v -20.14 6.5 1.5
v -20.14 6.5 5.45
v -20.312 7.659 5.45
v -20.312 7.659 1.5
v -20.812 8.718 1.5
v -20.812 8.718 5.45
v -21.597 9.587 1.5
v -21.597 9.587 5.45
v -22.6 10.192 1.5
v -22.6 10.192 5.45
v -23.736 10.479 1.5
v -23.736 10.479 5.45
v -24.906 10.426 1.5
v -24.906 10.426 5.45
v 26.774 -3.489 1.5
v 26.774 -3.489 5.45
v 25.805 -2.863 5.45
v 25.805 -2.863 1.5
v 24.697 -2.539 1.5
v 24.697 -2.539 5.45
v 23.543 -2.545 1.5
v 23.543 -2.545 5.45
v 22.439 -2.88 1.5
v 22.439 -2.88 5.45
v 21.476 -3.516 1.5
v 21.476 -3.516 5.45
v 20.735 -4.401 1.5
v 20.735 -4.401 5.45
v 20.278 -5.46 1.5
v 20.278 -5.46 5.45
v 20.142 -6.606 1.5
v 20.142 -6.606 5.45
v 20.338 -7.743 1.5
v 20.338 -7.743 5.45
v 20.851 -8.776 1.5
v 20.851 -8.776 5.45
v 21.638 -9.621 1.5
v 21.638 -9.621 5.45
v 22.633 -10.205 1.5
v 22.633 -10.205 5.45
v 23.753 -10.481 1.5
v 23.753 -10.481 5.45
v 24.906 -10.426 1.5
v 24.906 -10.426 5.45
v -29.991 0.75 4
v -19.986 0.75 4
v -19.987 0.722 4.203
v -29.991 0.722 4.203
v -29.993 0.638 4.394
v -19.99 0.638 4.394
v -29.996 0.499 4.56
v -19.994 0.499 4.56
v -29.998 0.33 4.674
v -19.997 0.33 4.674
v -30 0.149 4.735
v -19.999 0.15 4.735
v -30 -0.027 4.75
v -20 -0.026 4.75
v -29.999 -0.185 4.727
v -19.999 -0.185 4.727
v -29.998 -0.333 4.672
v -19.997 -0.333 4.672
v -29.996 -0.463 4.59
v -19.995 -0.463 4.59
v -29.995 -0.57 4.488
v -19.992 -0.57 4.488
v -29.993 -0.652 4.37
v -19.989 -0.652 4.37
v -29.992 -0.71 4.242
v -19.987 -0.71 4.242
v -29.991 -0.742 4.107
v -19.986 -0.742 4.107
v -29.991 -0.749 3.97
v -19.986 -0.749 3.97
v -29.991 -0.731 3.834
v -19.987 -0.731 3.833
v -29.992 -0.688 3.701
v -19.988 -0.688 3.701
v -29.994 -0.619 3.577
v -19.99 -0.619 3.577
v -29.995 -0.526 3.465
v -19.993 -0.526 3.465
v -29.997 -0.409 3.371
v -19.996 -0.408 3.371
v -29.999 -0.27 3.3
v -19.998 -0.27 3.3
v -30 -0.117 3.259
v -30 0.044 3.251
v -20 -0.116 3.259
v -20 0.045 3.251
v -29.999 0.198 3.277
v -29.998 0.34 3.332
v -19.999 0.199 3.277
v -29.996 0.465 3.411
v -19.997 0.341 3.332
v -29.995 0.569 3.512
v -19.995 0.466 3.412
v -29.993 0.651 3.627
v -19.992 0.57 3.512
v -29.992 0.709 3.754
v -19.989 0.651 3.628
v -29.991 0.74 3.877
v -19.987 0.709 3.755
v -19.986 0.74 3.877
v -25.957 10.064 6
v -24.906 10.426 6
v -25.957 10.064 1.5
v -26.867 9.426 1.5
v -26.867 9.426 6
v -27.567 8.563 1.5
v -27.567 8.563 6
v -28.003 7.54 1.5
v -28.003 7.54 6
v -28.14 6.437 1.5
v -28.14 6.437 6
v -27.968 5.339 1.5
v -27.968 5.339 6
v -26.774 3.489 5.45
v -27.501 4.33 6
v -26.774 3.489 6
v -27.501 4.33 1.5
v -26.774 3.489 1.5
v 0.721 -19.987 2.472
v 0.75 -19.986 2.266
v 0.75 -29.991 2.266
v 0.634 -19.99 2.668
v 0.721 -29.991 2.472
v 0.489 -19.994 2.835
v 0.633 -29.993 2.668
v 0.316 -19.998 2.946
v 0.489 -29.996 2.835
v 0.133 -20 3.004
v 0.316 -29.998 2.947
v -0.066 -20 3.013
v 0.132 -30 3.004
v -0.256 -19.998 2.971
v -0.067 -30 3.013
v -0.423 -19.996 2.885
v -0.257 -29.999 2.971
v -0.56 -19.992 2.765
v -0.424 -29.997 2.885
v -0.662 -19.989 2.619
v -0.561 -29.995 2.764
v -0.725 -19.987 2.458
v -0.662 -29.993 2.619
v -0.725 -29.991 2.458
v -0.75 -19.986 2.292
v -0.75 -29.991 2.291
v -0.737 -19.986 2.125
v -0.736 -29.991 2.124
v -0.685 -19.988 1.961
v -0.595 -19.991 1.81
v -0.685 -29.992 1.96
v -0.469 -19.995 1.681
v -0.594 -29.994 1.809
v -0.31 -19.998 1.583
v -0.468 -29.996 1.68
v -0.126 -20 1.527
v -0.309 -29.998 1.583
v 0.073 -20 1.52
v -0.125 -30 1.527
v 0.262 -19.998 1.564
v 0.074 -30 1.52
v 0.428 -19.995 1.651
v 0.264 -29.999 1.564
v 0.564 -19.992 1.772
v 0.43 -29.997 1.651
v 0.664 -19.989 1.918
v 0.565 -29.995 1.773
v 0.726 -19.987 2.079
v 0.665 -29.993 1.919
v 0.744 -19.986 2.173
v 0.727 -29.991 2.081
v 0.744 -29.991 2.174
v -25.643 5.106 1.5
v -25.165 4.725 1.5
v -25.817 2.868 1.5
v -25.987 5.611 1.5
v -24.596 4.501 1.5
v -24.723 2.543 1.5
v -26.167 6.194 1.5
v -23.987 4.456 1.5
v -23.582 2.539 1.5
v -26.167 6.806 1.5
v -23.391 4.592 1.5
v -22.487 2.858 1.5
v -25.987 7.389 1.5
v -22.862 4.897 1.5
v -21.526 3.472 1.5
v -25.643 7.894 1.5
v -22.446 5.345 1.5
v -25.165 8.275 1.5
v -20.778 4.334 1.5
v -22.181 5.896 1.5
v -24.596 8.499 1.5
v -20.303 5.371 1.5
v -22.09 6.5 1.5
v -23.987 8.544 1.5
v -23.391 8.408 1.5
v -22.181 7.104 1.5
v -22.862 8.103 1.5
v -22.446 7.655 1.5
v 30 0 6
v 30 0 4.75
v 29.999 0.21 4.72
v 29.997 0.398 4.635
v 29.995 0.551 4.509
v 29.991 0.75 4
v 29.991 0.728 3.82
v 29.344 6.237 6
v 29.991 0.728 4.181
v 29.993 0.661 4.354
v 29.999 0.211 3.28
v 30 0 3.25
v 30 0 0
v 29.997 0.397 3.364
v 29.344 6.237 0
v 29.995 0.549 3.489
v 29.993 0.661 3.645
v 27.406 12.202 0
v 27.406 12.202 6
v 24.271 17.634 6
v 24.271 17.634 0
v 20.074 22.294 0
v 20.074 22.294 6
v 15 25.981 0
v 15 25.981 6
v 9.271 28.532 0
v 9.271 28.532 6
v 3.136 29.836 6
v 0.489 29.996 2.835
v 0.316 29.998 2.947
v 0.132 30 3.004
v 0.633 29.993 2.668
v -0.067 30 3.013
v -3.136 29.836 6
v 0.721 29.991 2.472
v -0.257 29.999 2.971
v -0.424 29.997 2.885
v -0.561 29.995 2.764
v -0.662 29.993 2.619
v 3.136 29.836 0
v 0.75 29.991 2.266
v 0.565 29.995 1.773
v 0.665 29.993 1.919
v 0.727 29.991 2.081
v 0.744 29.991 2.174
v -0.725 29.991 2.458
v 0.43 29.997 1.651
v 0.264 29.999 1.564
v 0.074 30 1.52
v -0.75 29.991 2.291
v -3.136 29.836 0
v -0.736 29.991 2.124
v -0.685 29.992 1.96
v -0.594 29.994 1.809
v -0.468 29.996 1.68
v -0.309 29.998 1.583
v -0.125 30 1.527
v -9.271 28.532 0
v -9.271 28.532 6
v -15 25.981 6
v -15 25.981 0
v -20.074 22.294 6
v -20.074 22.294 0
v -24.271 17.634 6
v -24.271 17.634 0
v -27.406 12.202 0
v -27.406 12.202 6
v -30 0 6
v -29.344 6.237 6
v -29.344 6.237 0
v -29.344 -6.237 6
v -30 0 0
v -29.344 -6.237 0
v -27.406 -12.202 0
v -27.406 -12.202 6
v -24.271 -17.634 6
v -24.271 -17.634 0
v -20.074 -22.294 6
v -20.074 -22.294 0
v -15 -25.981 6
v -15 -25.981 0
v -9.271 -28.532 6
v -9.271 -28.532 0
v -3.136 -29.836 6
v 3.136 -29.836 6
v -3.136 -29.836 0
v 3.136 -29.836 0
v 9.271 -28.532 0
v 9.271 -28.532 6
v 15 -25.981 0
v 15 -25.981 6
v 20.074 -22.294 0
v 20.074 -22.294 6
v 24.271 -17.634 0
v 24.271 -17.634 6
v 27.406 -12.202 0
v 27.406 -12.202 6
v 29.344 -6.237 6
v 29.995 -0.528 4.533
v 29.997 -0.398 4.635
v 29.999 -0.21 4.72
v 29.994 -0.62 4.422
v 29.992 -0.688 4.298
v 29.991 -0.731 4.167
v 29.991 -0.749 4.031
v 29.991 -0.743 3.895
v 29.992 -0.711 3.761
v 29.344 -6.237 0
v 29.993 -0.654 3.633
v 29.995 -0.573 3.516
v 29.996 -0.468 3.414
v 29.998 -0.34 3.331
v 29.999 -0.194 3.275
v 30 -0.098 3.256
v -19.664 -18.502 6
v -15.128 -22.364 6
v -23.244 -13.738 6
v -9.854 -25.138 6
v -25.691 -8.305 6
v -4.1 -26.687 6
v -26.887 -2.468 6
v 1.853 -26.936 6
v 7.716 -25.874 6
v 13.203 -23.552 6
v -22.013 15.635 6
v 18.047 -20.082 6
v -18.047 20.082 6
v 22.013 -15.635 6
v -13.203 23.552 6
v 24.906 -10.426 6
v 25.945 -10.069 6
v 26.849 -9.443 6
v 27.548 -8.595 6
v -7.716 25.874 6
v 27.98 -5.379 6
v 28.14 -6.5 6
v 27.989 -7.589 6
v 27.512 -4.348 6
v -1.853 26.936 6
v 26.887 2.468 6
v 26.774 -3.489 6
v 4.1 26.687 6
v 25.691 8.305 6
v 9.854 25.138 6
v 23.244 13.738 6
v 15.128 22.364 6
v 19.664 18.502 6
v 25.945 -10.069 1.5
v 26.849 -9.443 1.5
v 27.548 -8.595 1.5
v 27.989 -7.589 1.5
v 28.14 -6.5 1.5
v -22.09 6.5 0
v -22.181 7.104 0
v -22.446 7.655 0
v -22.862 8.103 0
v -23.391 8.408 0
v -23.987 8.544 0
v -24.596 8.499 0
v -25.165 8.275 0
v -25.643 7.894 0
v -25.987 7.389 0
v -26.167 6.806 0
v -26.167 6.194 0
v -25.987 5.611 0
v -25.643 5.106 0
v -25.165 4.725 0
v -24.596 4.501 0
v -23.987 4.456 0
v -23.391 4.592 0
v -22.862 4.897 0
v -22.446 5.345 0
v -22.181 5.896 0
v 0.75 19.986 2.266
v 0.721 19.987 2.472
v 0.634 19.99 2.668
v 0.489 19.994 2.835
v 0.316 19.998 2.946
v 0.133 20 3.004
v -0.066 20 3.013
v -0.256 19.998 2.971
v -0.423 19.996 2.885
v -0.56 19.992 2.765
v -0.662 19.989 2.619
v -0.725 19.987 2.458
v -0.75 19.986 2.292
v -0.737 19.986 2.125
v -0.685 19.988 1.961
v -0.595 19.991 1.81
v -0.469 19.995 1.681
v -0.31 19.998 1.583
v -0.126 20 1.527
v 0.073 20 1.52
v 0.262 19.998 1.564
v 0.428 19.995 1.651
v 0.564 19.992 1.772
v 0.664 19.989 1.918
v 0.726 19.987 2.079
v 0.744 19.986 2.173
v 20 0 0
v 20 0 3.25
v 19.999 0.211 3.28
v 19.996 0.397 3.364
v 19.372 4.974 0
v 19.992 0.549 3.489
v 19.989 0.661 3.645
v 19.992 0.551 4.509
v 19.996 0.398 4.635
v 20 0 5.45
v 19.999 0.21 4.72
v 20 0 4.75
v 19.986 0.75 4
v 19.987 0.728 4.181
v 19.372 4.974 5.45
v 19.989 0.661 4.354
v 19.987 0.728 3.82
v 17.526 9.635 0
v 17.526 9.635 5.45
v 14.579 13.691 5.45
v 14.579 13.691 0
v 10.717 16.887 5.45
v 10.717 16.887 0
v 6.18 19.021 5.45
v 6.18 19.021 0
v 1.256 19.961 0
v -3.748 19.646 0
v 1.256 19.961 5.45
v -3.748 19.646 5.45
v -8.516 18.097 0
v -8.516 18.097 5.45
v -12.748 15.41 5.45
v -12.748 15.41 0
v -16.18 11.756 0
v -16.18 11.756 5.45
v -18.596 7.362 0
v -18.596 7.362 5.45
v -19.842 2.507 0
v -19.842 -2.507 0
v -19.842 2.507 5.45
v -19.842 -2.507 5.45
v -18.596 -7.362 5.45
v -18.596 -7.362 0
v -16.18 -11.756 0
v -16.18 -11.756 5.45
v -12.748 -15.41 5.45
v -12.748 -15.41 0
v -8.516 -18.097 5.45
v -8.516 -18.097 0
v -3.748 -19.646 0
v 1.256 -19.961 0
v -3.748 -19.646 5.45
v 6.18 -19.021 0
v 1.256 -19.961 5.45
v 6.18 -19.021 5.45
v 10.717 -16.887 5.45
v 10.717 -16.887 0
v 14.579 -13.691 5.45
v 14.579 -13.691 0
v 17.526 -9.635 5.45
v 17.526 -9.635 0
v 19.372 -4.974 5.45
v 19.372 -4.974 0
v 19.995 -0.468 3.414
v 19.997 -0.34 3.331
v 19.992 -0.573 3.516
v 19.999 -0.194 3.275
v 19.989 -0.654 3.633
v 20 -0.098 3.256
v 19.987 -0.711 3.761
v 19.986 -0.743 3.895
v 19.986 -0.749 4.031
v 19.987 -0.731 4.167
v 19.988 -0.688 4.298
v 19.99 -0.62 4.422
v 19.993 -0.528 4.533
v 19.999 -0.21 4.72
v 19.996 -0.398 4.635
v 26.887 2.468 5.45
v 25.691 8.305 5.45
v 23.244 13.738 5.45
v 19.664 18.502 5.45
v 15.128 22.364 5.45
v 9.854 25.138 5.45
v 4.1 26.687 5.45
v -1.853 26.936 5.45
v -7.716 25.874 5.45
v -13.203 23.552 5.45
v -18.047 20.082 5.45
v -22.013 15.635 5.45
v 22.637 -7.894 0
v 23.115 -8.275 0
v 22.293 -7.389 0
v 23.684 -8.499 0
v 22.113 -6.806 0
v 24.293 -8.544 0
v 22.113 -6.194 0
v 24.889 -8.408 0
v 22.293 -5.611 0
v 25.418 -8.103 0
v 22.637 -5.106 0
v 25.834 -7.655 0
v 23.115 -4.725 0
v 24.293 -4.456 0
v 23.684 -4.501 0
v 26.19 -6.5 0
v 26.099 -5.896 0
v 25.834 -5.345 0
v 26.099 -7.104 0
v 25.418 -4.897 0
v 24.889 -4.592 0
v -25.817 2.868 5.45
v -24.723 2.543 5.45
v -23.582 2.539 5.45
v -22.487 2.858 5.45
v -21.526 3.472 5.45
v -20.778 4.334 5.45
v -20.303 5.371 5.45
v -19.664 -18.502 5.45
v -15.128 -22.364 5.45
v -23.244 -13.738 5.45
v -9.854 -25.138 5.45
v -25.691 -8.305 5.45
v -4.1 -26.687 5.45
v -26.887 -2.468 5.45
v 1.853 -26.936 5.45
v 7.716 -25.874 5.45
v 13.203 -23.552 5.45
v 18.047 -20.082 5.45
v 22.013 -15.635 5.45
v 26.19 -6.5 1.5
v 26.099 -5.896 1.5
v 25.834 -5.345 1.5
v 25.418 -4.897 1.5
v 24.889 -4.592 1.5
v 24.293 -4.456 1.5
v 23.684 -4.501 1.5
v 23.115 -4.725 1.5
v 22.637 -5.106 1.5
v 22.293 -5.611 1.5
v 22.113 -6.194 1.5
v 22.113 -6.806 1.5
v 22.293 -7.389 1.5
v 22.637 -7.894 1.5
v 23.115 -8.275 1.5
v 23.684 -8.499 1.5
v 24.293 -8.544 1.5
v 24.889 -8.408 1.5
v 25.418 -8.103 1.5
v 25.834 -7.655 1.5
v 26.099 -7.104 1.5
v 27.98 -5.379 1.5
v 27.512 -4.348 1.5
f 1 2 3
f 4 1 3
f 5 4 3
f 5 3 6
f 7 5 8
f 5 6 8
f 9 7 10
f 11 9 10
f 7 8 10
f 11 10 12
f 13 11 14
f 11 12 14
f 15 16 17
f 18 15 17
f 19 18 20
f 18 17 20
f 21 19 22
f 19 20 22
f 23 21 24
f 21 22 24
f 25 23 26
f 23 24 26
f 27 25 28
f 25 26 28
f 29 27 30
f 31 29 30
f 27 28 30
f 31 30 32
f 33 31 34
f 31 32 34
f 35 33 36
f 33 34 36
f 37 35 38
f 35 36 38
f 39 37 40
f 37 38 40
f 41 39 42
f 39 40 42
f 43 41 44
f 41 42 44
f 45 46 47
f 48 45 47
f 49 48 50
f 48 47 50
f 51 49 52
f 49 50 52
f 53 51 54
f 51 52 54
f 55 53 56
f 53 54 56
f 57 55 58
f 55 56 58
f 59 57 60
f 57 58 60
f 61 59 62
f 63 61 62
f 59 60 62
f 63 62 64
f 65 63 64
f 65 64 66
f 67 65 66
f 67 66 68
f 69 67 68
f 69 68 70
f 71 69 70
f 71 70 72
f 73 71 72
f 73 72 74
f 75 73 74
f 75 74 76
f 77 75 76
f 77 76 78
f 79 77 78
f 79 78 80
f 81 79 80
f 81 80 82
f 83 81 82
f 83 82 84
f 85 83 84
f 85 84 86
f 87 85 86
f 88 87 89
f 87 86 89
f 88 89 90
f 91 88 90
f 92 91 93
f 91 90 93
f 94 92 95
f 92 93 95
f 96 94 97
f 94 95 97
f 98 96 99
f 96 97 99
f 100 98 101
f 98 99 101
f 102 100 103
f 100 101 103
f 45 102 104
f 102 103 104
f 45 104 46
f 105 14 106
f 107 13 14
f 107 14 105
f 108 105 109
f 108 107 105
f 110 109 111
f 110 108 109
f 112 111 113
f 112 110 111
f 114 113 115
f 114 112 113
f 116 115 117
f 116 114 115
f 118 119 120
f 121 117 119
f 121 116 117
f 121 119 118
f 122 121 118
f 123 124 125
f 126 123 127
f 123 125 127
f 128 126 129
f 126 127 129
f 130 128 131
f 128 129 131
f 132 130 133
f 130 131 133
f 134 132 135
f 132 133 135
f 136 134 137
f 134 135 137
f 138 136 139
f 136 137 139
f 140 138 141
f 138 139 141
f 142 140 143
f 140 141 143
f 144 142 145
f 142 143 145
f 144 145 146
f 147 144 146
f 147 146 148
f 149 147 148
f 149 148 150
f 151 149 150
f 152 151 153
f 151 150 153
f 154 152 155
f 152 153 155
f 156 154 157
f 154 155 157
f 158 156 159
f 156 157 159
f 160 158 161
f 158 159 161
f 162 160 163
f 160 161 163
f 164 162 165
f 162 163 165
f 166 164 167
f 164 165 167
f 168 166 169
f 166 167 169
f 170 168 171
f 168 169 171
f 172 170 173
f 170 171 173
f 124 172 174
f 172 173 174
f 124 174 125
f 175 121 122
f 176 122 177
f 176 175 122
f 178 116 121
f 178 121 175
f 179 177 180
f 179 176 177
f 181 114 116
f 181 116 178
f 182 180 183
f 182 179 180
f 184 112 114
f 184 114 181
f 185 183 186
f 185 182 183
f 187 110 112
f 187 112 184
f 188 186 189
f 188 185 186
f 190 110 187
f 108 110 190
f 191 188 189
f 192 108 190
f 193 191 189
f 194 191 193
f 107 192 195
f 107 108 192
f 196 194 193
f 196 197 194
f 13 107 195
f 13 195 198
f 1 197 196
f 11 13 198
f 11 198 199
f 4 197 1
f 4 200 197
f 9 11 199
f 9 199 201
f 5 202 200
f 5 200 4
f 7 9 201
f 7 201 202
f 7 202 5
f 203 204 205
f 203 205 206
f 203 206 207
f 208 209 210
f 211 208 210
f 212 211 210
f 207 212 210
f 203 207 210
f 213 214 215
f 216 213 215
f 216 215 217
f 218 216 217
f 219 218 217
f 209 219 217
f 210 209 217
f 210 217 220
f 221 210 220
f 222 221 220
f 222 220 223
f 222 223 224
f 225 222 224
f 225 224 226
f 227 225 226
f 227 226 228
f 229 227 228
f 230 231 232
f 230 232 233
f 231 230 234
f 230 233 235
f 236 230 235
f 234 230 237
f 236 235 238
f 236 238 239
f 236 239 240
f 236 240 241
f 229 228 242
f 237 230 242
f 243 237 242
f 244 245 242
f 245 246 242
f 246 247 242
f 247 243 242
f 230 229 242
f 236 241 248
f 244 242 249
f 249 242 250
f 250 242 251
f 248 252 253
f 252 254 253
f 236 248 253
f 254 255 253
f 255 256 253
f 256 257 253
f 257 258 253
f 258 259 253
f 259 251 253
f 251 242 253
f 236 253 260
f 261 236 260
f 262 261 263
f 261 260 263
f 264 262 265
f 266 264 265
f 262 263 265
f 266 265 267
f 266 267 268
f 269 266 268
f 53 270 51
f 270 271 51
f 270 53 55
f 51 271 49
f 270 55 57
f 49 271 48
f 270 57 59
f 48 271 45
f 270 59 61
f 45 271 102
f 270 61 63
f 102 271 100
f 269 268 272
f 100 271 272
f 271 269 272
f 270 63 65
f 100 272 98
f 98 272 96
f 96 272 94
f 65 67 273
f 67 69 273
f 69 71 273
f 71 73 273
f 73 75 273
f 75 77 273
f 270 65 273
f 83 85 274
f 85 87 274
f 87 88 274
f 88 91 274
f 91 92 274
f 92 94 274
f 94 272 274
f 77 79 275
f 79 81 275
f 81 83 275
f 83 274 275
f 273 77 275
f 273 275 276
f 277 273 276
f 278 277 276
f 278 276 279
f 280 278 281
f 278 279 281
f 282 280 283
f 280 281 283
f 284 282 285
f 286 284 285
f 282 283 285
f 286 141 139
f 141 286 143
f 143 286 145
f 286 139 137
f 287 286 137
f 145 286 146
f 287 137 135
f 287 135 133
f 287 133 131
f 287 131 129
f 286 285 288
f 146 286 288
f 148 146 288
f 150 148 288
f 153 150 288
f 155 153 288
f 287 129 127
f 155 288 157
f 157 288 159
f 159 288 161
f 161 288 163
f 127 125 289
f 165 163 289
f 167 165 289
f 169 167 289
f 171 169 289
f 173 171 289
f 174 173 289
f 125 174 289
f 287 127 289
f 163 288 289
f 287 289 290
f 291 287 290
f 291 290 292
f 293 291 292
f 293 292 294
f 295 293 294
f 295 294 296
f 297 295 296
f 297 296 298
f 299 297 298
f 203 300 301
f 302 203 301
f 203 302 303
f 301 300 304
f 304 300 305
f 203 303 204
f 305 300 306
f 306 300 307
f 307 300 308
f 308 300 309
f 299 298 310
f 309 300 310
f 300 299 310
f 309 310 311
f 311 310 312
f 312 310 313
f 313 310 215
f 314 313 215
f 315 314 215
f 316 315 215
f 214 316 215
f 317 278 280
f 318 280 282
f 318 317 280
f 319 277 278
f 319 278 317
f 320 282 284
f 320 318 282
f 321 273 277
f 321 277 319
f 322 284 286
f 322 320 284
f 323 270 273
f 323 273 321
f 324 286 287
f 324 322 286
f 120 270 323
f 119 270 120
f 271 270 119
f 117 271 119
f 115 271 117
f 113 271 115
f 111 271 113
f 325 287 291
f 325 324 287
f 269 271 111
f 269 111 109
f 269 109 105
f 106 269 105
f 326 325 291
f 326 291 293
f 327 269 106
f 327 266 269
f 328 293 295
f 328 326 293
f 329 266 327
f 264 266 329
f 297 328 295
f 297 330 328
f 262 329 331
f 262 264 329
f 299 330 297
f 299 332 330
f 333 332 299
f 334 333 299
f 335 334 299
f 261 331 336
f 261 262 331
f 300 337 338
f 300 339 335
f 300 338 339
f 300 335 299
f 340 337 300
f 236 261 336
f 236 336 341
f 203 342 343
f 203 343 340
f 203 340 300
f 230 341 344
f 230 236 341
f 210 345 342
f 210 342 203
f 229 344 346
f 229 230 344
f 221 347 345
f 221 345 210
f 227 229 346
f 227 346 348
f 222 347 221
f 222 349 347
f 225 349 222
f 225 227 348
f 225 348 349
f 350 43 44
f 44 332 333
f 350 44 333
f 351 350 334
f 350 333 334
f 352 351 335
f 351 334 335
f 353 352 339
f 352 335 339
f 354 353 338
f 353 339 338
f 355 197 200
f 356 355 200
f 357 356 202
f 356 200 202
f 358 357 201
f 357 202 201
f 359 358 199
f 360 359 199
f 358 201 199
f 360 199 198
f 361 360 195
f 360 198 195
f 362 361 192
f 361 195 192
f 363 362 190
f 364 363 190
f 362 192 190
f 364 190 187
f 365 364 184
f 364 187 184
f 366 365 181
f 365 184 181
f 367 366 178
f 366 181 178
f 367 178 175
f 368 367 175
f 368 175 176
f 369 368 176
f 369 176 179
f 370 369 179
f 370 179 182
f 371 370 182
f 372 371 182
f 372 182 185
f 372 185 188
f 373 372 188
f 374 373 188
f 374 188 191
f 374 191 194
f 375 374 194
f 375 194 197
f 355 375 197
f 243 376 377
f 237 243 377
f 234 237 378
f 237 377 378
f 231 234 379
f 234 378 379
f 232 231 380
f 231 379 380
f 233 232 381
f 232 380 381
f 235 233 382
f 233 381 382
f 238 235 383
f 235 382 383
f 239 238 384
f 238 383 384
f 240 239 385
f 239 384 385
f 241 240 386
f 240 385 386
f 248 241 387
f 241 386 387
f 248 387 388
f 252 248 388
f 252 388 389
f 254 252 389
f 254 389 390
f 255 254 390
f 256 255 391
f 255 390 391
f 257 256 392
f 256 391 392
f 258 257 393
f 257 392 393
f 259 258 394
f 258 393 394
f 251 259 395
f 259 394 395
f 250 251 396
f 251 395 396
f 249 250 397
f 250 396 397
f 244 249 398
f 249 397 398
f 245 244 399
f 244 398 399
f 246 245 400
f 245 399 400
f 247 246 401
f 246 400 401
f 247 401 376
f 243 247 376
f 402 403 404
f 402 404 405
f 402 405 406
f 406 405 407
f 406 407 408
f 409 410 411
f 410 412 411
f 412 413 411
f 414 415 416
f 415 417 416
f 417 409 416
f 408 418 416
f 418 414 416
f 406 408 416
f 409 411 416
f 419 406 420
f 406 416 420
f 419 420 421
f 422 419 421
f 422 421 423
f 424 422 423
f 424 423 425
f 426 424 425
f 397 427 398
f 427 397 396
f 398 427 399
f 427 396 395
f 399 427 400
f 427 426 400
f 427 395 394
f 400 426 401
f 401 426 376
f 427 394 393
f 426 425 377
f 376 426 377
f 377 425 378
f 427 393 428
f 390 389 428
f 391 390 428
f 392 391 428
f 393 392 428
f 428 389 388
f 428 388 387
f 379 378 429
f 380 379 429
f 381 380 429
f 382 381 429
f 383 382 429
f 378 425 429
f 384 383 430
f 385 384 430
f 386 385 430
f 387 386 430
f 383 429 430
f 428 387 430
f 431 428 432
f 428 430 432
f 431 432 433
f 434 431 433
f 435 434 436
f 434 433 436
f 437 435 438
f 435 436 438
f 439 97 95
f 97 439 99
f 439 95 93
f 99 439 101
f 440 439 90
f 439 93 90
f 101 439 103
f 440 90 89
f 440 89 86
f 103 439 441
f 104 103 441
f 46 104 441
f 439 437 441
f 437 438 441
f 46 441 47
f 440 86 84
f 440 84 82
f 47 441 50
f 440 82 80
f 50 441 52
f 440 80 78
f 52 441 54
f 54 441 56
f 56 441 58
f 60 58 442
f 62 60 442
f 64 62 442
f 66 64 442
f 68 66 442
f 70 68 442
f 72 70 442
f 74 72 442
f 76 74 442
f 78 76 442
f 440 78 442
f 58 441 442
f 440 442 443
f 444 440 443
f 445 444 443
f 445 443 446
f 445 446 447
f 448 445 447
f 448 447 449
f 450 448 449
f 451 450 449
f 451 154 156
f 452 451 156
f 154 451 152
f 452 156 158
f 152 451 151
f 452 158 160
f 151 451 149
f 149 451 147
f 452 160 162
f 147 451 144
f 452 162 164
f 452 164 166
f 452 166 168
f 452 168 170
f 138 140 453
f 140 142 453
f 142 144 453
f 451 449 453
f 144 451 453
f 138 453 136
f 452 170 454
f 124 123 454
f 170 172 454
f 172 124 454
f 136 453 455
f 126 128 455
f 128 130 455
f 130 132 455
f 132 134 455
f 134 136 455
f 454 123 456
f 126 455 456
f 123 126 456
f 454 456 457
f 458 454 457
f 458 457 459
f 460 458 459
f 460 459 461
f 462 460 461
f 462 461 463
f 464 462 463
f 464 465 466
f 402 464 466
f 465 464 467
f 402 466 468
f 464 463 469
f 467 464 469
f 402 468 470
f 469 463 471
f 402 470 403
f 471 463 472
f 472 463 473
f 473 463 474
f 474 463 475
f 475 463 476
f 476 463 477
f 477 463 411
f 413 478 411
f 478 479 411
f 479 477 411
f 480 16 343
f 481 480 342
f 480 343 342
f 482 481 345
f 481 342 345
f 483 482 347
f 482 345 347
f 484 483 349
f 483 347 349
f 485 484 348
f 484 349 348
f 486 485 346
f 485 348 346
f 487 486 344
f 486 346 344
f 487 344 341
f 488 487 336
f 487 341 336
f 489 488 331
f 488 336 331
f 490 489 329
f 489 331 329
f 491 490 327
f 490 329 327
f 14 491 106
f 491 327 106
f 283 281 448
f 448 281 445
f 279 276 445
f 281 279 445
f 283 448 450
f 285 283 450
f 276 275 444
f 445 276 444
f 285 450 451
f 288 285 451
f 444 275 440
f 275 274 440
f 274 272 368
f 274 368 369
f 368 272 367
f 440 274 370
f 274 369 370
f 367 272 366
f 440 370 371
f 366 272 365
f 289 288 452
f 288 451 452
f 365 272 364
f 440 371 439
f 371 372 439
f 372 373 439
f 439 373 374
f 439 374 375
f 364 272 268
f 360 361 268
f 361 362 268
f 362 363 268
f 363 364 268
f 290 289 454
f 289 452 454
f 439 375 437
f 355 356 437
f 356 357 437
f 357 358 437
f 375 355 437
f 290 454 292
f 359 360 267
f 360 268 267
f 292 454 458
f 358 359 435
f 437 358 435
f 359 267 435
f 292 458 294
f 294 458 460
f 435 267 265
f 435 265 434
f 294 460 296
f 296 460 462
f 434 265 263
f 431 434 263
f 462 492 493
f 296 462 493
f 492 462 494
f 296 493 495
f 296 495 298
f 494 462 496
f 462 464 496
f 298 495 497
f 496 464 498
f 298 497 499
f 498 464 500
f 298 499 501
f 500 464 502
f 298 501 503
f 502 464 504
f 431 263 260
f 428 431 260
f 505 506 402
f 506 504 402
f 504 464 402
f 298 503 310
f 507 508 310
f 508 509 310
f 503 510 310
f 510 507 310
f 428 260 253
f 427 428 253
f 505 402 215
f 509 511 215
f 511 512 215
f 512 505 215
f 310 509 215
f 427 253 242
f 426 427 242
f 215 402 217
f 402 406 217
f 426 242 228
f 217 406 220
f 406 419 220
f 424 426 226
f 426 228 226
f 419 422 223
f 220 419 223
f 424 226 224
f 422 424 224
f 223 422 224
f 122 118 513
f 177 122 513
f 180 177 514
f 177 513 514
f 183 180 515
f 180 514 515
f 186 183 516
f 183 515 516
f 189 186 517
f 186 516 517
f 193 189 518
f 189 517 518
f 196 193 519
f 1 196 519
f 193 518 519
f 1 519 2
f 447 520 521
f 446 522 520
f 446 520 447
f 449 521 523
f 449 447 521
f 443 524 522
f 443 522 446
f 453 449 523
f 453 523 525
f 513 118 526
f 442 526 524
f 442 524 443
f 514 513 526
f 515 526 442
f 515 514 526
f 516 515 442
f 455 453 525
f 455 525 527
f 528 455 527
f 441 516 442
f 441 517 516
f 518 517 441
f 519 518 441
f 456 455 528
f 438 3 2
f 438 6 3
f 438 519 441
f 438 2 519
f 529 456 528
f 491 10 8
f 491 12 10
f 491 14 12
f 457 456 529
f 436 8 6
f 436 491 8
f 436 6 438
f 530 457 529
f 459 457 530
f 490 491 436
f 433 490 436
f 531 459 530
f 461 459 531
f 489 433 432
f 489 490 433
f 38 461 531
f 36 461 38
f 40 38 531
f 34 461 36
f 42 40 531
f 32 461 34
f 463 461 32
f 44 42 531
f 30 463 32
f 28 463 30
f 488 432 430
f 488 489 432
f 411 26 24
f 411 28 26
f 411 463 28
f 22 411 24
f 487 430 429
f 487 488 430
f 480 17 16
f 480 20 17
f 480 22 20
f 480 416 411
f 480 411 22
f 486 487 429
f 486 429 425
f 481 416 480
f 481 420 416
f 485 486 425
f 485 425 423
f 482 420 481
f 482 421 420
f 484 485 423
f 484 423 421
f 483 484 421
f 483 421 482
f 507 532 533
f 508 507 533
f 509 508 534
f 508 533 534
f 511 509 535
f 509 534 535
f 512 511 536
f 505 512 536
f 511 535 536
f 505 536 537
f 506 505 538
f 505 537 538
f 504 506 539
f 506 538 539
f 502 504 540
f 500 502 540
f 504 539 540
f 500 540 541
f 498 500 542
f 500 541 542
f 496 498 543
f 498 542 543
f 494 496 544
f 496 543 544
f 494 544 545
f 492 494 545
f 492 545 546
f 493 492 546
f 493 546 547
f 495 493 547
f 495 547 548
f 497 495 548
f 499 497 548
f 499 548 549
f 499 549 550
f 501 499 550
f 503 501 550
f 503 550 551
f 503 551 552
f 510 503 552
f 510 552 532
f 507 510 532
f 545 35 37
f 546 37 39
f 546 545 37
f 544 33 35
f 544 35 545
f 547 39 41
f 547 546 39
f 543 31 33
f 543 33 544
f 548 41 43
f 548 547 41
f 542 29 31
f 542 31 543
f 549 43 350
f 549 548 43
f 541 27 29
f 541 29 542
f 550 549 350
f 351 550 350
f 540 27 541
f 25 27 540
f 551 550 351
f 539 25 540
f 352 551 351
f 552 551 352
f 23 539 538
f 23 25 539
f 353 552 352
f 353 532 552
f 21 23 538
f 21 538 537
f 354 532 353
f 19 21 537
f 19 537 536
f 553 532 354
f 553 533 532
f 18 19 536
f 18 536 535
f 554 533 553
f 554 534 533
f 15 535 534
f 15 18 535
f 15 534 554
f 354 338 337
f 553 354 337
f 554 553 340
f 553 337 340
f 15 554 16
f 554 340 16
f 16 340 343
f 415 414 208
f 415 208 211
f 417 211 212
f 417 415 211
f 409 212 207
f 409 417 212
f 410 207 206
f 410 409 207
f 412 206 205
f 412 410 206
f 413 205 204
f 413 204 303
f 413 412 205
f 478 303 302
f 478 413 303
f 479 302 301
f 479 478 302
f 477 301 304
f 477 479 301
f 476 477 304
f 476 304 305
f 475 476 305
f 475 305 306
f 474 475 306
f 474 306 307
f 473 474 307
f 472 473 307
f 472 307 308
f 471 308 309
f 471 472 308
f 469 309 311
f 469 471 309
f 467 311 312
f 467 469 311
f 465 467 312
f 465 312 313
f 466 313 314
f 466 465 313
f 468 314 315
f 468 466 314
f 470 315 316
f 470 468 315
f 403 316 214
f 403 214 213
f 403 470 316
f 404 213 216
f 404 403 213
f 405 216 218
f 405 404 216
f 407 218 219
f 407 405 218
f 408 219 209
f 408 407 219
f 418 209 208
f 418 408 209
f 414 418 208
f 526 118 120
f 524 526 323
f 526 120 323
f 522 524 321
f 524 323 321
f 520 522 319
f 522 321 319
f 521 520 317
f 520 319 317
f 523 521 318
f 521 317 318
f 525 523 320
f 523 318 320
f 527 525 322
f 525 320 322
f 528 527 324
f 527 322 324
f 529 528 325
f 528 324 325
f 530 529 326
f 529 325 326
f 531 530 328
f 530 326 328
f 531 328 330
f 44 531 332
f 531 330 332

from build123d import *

# Parameters (mm, degrees)
F0_R           = 30
F1_DEPTH       = 6
F2_R           = 27
F3_DEPTH       = 0.55
F4_R           = 0.75
F5_DEPTH       = 30.001
F5_DEPTH_BACK  = 30.001
F6_R           = 20
F7_DEPTH       = 5.4510001
F8_R           = 0.75
F9_DEPTH       = 30.0010001
F9_DEPTH_BACK  = 30.0010001
F11_DEPTH      = 3.95
F11_DEPTH_BACK = 0.5510001
F13_DEPTH      = 4.5
F14_R          = 2.05
F15_DEPTH      = 1.5010001


with BuildPart() as f1:
    # F0 (on Top) → F1 (new body)
    with BuildSketch(Plane.XY):
        Circle(F0_R)
    extrude(amount=F1_DEPTH)

    # F2 (on face) → F3 (cut)
    with BuildSketch(Plane.XY.offset(6)):
        Circle(F2_R)
    extrude(amount=-F3_DEPTH, mode=Mode.SUBTRACT)

    # F4 (on Front) → F5 (cut, two sides)
    with BuildSketch(Plane.XZ) as f5_sk:
        with Locations((0, 2.2661738681)):
            Circle(F4_R)
    extrude(amount=-F5_DEPTH, mode=Mode.SUBTRACT)
    extrude(f5_sk.sketch, amount=F5_DEPTH_BACK, mode=Mode.SUBTRACT)

    # F6 (on face) → F7 (cut, through all)
    with BuildSketch(Plane.XY.offset(5.45)):
        Circle(F6_R)
    extrude(amount=-F7_DEPTH, mode=Mode.SUBTRACT)

    # F8 (on Right) → F9 (cut, two sides)
    with BuildSketch(Plane.YZ) as f9_sk:
        with Locations((0, 4)):
            Circle(F8_R)
    extrude(amount=-F9_DEPTH, mode=Mode.SUBTRACT)
    extrude(f9_sk.sketch, amount=F9_DEPTH_BACK, mode=Mode.SUBTRACT)

    # F10 (on face) → F11 (cut, two sides)
    with BuildSketch(Plane.XY.offset(5.45)) as f11_sk:
        with BuildLine():
            ThreePointArc((-24.9057688902, 10.4260575477), (-28.0026498746, 7.54), (-26.7736042577, 3.4891424523))
            ThreePointArc((-26.7736042577, 3.4891424523), (-26.0714326419, 7.02), (-24.9057688902, 10.4260575477))
        make_face()
        with BuildLine():
            ThreePointArc((24.9057688902, -10.4260575477), (26.0714326419, -7.02), (26.7736042577, -3.4891424523))
            ThreePointArc((26.7736042577, -3.4891424523), (20.2777809437, -5.46), (24.9057688902, -10.4260575477))
        make_face()
    extrude(amount=-F11_DEPTH, mode=Mode.SUBTRACT)
    extrude(f11_sk.sketch, amount=F11_DEPTH_BACK, mode=Mode.SUBTRACT)

    # F12 (on face) → F13 (cut)
    with BuildSketch(Plane.XY.offset(6)):
        with BuildLine():
            ThreePointArc((-26.7736042577, 3.4891424523), (-22.4869694193, 2.8576411905), (-20.1402154091, 6.5))
            ThreePointArc((-20.1402154091, 6.5), (-21.5968135459, 9.587249093), (-24.9057688902, 10.4260575477))
            ThreePointArc((-24.9057688902, 10.4260575477), (-28.0026498746, 7.54), (-26.7736042577, 3.4891424523))
        make_face()
        with BuildLine():
            ThreePointArc((26.7736042577, -3.4891424523), (26.0714326419, -7.02), (24.9057688902, -10.4260575477))
            ThreePointArc((24.9057688902, -10.4260575477), (27.2274645021, -9.0434018632), (28.1402154091, -6.5))
            ThreePointArc((28.1402154091, -6.5), (27.7825742186, -4.8467540102), (26.7736042577, -3.4891424523))
        make_face()
    extrude(amount=-F13_DEPTH, mode=Mode.SUBTRACT)

    # F14 (on face) → F15 (cut, through all)
    with BuildSketch(Plane.XY.offset(1.5)):
        with Locations((-24.1402154091, 6.5)):
            Circle(F14_R)
        with Locations((24.1402154091, -6.5)):
            Circle(F14_R)
    extrude(amount=-F15_DEPTH, mode=Mode.SUBTRACT)


solid = f1.part
